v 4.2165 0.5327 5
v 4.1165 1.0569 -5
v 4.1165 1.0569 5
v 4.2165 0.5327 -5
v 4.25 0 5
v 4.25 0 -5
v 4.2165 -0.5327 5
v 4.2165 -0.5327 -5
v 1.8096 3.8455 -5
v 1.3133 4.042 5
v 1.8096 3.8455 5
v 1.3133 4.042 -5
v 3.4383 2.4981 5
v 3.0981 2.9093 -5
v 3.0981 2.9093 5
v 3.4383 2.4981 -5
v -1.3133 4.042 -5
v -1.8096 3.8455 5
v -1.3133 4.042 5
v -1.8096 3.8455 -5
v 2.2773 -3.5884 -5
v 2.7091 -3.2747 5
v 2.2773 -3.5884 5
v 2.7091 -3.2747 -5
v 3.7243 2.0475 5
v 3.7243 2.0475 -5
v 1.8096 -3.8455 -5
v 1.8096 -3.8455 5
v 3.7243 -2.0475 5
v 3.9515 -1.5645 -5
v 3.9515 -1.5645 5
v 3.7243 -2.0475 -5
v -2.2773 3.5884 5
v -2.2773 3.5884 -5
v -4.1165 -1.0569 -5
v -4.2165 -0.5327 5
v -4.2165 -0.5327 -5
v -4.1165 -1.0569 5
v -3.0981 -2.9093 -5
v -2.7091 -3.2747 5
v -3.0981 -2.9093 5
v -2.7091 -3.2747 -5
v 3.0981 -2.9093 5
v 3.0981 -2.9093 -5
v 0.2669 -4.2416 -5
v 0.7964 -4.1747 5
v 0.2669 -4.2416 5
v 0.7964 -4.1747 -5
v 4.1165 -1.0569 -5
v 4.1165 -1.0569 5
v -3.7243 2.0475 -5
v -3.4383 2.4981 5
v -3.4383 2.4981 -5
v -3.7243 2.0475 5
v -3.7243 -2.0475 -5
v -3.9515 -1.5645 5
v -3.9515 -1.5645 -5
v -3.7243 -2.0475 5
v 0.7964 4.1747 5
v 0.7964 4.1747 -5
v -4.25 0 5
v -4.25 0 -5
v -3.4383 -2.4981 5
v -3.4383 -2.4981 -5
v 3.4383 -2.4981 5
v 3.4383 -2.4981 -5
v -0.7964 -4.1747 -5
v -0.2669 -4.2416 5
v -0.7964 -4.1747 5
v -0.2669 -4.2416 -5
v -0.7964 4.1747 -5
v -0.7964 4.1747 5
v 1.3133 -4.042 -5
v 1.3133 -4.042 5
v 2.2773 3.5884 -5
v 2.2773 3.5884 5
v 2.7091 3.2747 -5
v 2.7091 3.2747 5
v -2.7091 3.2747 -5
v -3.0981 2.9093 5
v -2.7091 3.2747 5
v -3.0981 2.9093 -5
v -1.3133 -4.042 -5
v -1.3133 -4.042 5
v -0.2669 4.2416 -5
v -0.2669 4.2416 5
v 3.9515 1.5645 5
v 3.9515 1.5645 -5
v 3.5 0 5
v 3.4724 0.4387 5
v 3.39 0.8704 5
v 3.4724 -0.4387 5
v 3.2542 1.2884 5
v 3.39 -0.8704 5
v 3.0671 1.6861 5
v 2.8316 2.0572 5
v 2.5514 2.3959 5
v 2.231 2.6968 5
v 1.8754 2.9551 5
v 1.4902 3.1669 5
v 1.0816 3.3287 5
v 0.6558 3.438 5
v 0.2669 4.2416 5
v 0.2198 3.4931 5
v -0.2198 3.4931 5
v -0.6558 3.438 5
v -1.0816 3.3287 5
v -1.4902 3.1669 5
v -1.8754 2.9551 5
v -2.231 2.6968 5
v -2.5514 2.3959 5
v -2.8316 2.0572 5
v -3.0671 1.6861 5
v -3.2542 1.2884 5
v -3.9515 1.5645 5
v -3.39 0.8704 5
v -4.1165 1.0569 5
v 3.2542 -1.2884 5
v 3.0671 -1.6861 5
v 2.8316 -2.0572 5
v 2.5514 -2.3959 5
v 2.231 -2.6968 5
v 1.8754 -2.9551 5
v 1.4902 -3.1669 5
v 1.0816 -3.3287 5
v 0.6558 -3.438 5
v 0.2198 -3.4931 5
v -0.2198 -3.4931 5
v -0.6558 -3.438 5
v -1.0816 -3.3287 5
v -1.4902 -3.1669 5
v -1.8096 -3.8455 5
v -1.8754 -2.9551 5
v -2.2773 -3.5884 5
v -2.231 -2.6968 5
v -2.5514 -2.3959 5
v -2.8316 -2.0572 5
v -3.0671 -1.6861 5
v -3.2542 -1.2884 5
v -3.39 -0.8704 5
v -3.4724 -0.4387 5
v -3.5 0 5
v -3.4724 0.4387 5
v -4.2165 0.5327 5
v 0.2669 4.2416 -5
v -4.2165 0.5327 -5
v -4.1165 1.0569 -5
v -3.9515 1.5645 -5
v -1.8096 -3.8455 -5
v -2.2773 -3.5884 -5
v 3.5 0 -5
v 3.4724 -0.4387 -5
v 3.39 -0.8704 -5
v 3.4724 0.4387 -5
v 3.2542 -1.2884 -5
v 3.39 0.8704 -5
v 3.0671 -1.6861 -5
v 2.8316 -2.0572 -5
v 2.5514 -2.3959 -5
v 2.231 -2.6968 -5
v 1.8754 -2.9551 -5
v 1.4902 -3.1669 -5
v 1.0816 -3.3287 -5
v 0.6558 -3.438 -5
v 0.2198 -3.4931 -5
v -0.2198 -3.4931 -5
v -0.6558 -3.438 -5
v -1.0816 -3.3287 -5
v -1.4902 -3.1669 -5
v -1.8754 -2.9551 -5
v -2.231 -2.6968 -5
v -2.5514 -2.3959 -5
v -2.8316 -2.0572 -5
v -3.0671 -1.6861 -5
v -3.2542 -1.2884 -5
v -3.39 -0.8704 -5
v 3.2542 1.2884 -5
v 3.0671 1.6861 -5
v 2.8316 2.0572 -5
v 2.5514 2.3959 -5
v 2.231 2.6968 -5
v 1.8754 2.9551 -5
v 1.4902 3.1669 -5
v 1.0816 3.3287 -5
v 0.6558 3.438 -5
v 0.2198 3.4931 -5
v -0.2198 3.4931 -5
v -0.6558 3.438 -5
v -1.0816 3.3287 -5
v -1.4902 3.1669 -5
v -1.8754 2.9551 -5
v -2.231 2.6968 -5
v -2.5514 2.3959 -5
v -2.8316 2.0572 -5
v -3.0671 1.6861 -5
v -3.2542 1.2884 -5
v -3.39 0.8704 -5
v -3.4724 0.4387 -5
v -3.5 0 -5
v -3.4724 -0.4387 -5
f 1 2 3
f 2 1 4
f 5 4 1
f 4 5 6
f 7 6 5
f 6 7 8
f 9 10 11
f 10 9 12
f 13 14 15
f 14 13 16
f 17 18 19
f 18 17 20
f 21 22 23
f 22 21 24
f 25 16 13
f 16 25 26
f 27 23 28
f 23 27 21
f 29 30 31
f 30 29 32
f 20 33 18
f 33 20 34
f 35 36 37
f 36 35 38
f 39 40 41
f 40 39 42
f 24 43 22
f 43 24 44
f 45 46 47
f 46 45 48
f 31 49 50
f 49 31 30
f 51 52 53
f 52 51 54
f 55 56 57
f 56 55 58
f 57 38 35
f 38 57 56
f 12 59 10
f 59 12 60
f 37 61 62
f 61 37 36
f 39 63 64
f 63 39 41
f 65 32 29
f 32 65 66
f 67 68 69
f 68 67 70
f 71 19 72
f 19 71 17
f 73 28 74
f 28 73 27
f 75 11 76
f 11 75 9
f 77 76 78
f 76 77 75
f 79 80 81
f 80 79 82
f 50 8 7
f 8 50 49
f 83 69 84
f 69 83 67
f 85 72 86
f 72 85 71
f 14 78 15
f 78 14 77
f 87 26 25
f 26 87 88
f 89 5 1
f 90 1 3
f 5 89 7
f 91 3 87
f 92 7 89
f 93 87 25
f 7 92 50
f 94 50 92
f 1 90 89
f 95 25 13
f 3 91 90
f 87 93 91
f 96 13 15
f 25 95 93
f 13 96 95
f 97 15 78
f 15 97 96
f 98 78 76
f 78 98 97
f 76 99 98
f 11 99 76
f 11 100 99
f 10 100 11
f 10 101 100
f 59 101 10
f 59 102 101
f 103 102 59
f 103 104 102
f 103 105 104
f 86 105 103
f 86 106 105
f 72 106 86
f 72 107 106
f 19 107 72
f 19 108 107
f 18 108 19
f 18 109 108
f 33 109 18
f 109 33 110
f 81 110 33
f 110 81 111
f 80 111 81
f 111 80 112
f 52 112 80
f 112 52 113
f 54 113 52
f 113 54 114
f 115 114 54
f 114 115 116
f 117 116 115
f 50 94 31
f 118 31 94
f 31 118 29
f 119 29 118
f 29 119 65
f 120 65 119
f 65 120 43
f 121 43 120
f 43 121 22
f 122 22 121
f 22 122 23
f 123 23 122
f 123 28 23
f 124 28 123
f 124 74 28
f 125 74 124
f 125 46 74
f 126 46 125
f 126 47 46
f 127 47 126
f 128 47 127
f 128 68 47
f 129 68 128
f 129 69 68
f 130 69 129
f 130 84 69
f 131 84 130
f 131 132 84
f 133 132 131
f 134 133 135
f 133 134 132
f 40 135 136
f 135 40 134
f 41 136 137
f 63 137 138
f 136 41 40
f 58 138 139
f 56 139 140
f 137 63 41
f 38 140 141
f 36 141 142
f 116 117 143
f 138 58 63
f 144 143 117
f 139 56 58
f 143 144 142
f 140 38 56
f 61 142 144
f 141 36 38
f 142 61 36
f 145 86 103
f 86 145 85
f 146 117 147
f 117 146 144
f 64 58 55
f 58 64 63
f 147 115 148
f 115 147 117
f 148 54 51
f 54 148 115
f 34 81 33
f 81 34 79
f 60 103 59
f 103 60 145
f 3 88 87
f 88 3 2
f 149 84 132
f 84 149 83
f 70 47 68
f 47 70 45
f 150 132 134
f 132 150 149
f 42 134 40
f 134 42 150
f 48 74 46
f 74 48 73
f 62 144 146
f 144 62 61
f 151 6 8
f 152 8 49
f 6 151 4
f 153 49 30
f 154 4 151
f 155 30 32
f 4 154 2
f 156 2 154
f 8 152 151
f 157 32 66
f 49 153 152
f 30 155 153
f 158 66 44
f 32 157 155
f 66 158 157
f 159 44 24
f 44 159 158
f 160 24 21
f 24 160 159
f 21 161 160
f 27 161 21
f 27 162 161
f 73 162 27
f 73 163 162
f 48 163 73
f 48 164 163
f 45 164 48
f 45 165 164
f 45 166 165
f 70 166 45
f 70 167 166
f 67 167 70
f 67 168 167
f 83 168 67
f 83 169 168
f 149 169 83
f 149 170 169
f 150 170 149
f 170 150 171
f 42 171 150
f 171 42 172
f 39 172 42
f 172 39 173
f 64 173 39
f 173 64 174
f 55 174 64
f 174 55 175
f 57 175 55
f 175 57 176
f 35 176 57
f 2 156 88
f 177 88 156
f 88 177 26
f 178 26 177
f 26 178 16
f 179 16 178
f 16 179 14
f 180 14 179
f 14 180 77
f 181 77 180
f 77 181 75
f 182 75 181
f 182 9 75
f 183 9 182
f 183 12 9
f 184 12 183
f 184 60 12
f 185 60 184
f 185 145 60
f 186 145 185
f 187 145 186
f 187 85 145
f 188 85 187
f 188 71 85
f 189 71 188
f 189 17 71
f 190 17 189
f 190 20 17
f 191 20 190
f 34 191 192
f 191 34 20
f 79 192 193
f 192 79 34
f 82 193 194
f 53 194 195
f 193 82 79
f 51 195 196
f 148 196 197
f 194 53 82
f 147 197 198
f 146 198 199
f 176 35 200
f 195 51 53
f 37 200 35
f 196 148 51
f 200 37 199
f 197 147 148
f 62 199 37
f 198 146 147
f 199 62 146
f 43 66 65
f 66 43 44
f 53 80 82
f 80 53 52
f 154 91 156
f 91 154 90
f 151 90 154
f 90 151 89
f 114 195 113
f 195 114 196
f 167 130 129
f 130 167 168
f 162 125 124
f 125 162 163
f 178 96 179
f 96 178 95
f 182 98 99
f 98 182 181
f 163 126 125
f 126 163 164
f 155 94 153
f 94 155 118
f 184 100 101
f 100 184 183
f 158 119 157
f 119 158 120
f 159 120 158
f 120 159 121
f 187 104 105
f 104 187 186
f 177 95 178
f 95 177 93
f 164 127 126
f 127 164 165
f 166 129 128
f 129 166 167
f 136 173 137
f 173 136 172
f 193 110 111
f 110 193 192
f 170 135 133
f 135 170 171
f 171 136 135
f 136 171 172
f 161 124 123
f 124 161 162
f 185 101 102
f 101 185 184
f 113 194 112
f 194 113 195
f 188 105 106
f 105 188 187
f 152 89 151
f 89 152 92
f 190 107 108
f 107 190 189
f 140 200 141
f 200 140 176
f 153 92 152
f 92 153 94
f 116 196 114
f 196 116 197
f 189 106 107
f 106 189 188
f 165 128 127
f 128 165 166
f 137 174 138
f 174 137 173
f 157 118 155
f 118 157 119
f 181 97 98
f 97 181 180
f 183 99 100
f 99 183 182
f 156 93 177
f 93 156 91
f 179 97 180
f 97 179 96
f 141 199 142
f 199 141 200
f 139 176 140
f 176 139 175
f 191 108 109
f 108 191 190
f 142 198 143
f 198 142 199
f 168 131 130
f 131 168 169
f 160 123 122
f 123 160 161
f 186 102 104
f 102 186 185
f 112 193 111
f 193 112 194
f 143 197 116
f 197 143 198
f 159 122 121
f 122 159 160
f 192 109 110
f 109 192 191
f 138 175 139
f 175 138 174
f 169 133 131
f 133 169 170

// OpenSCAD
$fn = 50;


difference() {
	union() {
		translate(v = [0, 0, -5.0000000000]) {
			cylinder(h = 10, r = 4.2500000000);
		}
	}
	union() {
		translate(v = [0, 0, -100.0000000000]) {
			cylinder(h = 200, r = 3.5000000000);
		}
	}
}
